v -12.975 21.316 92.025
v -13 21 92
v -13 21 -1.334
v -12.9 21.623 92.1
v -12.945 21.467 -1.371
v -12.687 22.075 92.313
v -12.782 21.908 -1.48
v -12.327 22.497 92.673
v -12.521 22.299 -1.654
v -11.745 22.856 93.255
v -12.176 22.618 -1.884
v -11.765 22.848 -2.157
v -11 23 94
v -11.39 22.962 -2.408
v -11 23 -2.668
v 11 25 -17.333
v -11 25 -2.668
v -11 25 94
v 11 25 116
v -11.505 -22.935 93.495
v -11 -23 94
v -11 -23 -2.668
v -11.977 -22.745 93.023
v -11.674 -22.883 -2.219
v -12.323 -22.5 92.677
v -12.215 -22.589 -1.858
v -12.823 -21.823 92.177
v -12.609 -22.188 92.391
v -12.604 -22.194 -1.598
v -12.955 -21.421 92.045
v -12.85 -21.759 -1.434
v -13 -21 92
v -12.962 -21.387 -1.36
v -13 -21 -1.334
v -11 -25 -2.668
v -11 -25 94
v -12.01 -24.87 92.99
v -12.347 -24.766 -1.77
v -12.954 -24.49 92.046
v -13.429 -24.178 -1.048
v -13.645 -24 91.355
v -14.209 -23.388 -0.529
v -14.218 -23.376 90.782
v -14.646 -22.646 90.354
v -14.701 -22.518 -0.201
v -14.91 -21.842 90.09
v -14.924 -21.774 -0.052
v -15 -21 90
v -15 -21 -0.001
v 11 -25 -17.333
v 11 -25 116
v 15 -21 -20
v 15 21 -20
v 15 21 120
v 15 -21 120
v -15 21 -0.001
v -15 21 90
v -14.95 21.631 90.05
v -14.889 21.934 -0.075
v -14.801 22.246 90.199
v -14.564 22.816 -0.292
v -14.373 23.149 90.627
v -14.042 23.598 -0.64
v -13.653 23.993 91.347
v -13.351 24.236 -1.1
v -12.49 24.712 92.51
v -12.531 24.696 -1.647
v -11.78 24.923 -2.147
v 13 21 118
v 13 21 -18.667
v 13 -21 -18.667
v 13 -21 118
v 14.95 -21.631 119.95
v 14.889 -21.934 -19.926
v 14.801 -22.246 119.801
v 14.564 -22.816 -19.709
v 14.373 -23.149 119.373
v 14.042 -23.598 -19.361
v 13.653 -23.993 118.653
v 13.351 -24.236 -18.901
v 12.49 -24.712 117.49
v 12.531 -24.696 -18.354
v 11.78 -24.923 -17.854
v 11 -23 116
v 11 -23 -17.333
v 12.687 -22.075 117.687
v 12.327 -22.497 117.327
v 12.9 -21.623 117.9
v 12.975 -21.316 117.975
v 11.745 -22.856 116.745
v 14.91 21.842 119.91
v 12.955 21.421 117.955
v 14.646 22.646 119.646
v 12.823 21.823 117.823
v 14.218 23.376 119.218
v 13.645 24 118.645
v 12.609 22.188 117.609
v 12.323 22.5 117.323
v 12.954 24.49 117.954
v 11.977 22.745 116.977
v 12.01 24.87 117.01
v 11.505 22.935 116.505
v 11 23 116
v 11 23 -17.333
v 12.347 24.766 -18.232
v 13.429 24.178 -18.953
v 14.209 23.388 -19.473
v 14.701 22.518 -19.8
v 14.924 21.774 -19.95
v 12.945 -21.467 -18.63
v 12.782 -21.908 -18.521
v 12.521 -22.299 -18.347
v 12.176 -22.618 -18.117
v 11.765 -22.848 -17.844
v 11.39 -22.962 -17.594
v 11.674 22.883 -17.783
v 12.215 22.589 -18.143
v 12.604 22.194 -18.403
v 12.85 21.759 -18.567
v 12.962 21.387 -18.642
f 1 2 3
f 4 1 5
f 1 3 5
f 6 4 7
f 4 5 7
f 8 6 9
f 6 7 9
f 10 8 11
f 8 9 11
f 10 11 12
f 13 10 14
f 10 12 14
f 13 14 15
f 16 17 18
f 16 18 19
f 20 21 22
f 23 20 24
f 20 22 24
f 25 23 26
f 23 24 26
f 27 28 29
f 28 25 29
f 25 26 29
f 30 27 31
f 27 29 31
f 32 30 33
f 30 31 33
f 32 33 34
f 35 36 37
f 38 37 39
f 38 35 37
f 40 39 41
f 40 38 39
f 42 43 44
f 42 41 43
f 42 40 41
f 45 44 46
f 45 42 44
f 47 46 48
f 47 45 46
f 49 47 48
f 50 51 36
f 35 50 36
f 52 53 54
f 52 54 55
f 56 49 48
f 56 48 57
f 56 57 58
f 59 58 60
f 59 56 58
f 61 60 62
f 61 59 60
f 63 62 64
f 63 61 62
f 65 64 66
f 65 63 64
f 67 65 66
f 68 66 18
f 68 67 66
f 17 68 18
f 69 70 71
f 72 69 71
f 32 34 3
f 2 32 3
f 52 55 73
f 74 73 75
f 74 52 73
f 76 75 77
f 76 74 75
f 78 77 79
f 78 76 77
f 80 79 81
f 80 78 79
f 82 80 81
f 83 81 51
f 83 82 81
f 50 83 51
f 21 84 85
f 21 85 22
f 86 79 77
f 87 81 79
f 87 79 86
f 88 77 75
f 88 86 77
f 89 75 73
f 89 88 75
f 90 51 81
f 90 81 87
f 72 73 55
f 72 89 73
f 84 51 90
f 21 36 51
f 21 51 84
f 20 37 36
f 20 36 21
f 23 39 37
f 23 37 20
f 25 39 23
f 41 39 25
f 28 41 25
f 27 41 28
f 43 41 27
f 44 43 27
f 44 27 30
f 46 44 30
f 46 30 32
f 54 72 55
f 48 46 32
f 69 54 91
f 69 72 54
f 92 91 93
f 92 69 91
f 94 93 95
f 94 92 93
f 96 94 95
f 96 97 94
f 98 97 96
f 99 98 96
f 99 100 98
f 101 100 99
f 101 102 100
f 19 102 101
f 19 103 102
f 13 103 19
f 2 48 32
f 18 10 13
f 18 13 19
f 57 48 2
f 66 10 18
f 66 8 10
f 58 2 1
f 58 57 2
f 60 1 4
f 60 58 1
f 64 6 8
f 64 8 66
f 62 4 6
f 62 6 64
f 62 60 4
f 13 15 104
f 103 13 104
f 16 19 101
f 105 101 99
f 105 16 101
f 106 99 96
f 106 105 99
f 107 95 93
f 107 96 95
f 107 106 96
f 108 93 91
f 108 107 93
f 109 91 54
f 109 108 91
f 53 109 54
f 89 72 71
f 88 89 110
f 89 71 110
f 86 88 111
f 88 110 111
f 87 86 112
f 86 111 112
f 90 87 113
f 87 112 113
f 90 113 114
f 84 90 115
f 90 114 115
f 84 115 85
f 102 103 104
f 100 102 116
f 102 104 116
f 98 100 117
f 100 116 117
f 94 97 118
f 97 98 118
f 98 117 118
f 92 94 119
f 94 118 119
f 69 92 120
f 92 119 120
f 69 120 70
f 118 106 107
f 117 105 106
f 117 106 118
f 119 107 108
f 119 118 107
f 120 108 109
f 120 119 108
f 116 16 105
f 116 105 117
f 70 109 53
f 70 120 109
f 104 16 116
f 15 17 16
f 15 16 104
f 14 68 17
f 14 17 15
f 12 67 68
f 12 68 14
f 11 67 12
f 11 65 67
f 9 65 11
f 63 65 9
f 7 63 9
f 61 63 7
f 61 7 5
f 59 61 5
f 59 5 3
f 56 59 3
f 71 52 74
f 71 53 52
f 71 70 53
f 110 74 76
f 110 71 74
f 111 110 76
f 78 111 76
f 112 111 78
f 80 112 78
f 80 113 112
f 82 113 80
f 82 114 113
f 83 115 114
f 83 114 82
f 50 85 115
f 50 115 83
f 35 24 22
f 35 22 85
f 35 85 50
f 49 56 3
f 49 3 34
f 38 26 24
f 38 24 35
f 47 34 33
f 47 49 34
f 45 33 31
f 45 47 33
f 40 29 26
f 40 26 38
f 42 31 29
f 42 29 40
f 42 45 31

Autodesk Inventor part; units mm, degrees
ref_plane "Plano inicial" through (0, 0, -20) normal (0, 0, 1) x (1, 0, 0)
ref_plane "Plano final" through (0, 0, 120) normal (0, 0, 1) x (1, 0, 0)
sketch "Esboço" plane through (0, 0, 0) normal (0, 0, 1) x (1, 0, 0)
  line L0 (-15, -21) -> (-15, 21)
  line L1 (-11, 25) -> (11, 25)
  line L2 (15, 21) -> (15, -21)
  line L3 (11, -25) -> (-11, -25)
  arc A0 (-15, -21) -> (-11, -25) centre (-11, -21) ccw
  arc A1 (15, 21) -> (11, 25) centre (11, 21) ccw
  arc A2 (-11, 25) -> (-15, 21) centre (-11, 21) ccw
  arc A3 (11, -25) -> (15, -21) centre (11, -21) ccw
  arc A4 (-11, 23) -> (-13, 21) centre (-11, 21) ccw
  line L4 (-11, 23) -> (11, 23)
  arc A5 (13, 21) -> (11, 23) centre (11, 21) ccw
  line L5 (13, 21) -> (13, -21)
  arc A6 (11, -23) -> (13, -21) centre (11, -21) ccw
  line L6 (11, -23) -> (-11, -23)
  arc A7 (-13, -21) -> (-11, -23) centre (-11, -21) ccw
  line L7 (-13, -21) -> (-13, 21)
  line L8 (0, 36.1598) -> (0, -36.1598) construction
  line L9 (-22.1598, 0) -> (22.1598, 0) construction
  dimension "d7" = 4
  dimension "d9" = 30
  dimension "d11" = 50
  dimension "d12" = 2
  dimension "d15" = 15
  dimension "d16" = 25
extrude "Corpo" add sketch "Esboço" along normal up to surface (140 mm away) from surface at -20
sketch "Sketch3" plane through (0, 0, 0) normal (0, 0, 1) x (1, 0, 0)
  line L0 (0, 0) -> (10, 0)
ref_plane "Work Plane3" through (0, 0, 0) normal (0, -1, 0) x (1, 0, 0)
sketch "Sketch4" plane through (0, 0, 0) normal (0, -1, 0) x (1, 0, 0)
  line L0 (-2, -20) -> (12, -20)
  line L1 (-2, 120) -> (12, 120)
  dimension "d18" = 140
ref_plane "Plano de trabalho5" through (15, 0, 120) normal (-0.7071, 0, 0.7071) x (0.7071, 0, 0.7071)
split "Dividir2" plane through (15, 0, 120) removes the side toward (-0.7071, 0, 0.7071)
ref_plane "Plano de trabalho6" through (15, 0, -20) normal (-0.5547, 0, -0.8321) x (-0.8321, 0, 0.5547)
split "Dividir3" plane through (15, 0, -20) removes the side toward (-0.5547, 0, -0.8321)
equation "\"d7\" = G_IR"
equation "\"d9\" = G_W"
equation "\"d11\" = G_H"
equation "\"d12\" = G_T"
equation "\"d15\" = 0.5 * d9"
equation "\"d16\" = 0.5 * d11"
equation "\"d3\" = G_L"
equation "\"G_W\" = 30"
equation "\"G_H\" = 50"
equation "\"G_T\" = 2"
equation "\"G_IR\" = 4"
equation "\"G_L\" = d18"
equation "\"G_OFFSET_END\" = 30"
equation "\"d14\" = G_OFFSET_END + B_L"
equation "\"B_L\" = 90"
properties part number "ISO 4019 - 50x30x2 - 140" material "Aço, suave"
